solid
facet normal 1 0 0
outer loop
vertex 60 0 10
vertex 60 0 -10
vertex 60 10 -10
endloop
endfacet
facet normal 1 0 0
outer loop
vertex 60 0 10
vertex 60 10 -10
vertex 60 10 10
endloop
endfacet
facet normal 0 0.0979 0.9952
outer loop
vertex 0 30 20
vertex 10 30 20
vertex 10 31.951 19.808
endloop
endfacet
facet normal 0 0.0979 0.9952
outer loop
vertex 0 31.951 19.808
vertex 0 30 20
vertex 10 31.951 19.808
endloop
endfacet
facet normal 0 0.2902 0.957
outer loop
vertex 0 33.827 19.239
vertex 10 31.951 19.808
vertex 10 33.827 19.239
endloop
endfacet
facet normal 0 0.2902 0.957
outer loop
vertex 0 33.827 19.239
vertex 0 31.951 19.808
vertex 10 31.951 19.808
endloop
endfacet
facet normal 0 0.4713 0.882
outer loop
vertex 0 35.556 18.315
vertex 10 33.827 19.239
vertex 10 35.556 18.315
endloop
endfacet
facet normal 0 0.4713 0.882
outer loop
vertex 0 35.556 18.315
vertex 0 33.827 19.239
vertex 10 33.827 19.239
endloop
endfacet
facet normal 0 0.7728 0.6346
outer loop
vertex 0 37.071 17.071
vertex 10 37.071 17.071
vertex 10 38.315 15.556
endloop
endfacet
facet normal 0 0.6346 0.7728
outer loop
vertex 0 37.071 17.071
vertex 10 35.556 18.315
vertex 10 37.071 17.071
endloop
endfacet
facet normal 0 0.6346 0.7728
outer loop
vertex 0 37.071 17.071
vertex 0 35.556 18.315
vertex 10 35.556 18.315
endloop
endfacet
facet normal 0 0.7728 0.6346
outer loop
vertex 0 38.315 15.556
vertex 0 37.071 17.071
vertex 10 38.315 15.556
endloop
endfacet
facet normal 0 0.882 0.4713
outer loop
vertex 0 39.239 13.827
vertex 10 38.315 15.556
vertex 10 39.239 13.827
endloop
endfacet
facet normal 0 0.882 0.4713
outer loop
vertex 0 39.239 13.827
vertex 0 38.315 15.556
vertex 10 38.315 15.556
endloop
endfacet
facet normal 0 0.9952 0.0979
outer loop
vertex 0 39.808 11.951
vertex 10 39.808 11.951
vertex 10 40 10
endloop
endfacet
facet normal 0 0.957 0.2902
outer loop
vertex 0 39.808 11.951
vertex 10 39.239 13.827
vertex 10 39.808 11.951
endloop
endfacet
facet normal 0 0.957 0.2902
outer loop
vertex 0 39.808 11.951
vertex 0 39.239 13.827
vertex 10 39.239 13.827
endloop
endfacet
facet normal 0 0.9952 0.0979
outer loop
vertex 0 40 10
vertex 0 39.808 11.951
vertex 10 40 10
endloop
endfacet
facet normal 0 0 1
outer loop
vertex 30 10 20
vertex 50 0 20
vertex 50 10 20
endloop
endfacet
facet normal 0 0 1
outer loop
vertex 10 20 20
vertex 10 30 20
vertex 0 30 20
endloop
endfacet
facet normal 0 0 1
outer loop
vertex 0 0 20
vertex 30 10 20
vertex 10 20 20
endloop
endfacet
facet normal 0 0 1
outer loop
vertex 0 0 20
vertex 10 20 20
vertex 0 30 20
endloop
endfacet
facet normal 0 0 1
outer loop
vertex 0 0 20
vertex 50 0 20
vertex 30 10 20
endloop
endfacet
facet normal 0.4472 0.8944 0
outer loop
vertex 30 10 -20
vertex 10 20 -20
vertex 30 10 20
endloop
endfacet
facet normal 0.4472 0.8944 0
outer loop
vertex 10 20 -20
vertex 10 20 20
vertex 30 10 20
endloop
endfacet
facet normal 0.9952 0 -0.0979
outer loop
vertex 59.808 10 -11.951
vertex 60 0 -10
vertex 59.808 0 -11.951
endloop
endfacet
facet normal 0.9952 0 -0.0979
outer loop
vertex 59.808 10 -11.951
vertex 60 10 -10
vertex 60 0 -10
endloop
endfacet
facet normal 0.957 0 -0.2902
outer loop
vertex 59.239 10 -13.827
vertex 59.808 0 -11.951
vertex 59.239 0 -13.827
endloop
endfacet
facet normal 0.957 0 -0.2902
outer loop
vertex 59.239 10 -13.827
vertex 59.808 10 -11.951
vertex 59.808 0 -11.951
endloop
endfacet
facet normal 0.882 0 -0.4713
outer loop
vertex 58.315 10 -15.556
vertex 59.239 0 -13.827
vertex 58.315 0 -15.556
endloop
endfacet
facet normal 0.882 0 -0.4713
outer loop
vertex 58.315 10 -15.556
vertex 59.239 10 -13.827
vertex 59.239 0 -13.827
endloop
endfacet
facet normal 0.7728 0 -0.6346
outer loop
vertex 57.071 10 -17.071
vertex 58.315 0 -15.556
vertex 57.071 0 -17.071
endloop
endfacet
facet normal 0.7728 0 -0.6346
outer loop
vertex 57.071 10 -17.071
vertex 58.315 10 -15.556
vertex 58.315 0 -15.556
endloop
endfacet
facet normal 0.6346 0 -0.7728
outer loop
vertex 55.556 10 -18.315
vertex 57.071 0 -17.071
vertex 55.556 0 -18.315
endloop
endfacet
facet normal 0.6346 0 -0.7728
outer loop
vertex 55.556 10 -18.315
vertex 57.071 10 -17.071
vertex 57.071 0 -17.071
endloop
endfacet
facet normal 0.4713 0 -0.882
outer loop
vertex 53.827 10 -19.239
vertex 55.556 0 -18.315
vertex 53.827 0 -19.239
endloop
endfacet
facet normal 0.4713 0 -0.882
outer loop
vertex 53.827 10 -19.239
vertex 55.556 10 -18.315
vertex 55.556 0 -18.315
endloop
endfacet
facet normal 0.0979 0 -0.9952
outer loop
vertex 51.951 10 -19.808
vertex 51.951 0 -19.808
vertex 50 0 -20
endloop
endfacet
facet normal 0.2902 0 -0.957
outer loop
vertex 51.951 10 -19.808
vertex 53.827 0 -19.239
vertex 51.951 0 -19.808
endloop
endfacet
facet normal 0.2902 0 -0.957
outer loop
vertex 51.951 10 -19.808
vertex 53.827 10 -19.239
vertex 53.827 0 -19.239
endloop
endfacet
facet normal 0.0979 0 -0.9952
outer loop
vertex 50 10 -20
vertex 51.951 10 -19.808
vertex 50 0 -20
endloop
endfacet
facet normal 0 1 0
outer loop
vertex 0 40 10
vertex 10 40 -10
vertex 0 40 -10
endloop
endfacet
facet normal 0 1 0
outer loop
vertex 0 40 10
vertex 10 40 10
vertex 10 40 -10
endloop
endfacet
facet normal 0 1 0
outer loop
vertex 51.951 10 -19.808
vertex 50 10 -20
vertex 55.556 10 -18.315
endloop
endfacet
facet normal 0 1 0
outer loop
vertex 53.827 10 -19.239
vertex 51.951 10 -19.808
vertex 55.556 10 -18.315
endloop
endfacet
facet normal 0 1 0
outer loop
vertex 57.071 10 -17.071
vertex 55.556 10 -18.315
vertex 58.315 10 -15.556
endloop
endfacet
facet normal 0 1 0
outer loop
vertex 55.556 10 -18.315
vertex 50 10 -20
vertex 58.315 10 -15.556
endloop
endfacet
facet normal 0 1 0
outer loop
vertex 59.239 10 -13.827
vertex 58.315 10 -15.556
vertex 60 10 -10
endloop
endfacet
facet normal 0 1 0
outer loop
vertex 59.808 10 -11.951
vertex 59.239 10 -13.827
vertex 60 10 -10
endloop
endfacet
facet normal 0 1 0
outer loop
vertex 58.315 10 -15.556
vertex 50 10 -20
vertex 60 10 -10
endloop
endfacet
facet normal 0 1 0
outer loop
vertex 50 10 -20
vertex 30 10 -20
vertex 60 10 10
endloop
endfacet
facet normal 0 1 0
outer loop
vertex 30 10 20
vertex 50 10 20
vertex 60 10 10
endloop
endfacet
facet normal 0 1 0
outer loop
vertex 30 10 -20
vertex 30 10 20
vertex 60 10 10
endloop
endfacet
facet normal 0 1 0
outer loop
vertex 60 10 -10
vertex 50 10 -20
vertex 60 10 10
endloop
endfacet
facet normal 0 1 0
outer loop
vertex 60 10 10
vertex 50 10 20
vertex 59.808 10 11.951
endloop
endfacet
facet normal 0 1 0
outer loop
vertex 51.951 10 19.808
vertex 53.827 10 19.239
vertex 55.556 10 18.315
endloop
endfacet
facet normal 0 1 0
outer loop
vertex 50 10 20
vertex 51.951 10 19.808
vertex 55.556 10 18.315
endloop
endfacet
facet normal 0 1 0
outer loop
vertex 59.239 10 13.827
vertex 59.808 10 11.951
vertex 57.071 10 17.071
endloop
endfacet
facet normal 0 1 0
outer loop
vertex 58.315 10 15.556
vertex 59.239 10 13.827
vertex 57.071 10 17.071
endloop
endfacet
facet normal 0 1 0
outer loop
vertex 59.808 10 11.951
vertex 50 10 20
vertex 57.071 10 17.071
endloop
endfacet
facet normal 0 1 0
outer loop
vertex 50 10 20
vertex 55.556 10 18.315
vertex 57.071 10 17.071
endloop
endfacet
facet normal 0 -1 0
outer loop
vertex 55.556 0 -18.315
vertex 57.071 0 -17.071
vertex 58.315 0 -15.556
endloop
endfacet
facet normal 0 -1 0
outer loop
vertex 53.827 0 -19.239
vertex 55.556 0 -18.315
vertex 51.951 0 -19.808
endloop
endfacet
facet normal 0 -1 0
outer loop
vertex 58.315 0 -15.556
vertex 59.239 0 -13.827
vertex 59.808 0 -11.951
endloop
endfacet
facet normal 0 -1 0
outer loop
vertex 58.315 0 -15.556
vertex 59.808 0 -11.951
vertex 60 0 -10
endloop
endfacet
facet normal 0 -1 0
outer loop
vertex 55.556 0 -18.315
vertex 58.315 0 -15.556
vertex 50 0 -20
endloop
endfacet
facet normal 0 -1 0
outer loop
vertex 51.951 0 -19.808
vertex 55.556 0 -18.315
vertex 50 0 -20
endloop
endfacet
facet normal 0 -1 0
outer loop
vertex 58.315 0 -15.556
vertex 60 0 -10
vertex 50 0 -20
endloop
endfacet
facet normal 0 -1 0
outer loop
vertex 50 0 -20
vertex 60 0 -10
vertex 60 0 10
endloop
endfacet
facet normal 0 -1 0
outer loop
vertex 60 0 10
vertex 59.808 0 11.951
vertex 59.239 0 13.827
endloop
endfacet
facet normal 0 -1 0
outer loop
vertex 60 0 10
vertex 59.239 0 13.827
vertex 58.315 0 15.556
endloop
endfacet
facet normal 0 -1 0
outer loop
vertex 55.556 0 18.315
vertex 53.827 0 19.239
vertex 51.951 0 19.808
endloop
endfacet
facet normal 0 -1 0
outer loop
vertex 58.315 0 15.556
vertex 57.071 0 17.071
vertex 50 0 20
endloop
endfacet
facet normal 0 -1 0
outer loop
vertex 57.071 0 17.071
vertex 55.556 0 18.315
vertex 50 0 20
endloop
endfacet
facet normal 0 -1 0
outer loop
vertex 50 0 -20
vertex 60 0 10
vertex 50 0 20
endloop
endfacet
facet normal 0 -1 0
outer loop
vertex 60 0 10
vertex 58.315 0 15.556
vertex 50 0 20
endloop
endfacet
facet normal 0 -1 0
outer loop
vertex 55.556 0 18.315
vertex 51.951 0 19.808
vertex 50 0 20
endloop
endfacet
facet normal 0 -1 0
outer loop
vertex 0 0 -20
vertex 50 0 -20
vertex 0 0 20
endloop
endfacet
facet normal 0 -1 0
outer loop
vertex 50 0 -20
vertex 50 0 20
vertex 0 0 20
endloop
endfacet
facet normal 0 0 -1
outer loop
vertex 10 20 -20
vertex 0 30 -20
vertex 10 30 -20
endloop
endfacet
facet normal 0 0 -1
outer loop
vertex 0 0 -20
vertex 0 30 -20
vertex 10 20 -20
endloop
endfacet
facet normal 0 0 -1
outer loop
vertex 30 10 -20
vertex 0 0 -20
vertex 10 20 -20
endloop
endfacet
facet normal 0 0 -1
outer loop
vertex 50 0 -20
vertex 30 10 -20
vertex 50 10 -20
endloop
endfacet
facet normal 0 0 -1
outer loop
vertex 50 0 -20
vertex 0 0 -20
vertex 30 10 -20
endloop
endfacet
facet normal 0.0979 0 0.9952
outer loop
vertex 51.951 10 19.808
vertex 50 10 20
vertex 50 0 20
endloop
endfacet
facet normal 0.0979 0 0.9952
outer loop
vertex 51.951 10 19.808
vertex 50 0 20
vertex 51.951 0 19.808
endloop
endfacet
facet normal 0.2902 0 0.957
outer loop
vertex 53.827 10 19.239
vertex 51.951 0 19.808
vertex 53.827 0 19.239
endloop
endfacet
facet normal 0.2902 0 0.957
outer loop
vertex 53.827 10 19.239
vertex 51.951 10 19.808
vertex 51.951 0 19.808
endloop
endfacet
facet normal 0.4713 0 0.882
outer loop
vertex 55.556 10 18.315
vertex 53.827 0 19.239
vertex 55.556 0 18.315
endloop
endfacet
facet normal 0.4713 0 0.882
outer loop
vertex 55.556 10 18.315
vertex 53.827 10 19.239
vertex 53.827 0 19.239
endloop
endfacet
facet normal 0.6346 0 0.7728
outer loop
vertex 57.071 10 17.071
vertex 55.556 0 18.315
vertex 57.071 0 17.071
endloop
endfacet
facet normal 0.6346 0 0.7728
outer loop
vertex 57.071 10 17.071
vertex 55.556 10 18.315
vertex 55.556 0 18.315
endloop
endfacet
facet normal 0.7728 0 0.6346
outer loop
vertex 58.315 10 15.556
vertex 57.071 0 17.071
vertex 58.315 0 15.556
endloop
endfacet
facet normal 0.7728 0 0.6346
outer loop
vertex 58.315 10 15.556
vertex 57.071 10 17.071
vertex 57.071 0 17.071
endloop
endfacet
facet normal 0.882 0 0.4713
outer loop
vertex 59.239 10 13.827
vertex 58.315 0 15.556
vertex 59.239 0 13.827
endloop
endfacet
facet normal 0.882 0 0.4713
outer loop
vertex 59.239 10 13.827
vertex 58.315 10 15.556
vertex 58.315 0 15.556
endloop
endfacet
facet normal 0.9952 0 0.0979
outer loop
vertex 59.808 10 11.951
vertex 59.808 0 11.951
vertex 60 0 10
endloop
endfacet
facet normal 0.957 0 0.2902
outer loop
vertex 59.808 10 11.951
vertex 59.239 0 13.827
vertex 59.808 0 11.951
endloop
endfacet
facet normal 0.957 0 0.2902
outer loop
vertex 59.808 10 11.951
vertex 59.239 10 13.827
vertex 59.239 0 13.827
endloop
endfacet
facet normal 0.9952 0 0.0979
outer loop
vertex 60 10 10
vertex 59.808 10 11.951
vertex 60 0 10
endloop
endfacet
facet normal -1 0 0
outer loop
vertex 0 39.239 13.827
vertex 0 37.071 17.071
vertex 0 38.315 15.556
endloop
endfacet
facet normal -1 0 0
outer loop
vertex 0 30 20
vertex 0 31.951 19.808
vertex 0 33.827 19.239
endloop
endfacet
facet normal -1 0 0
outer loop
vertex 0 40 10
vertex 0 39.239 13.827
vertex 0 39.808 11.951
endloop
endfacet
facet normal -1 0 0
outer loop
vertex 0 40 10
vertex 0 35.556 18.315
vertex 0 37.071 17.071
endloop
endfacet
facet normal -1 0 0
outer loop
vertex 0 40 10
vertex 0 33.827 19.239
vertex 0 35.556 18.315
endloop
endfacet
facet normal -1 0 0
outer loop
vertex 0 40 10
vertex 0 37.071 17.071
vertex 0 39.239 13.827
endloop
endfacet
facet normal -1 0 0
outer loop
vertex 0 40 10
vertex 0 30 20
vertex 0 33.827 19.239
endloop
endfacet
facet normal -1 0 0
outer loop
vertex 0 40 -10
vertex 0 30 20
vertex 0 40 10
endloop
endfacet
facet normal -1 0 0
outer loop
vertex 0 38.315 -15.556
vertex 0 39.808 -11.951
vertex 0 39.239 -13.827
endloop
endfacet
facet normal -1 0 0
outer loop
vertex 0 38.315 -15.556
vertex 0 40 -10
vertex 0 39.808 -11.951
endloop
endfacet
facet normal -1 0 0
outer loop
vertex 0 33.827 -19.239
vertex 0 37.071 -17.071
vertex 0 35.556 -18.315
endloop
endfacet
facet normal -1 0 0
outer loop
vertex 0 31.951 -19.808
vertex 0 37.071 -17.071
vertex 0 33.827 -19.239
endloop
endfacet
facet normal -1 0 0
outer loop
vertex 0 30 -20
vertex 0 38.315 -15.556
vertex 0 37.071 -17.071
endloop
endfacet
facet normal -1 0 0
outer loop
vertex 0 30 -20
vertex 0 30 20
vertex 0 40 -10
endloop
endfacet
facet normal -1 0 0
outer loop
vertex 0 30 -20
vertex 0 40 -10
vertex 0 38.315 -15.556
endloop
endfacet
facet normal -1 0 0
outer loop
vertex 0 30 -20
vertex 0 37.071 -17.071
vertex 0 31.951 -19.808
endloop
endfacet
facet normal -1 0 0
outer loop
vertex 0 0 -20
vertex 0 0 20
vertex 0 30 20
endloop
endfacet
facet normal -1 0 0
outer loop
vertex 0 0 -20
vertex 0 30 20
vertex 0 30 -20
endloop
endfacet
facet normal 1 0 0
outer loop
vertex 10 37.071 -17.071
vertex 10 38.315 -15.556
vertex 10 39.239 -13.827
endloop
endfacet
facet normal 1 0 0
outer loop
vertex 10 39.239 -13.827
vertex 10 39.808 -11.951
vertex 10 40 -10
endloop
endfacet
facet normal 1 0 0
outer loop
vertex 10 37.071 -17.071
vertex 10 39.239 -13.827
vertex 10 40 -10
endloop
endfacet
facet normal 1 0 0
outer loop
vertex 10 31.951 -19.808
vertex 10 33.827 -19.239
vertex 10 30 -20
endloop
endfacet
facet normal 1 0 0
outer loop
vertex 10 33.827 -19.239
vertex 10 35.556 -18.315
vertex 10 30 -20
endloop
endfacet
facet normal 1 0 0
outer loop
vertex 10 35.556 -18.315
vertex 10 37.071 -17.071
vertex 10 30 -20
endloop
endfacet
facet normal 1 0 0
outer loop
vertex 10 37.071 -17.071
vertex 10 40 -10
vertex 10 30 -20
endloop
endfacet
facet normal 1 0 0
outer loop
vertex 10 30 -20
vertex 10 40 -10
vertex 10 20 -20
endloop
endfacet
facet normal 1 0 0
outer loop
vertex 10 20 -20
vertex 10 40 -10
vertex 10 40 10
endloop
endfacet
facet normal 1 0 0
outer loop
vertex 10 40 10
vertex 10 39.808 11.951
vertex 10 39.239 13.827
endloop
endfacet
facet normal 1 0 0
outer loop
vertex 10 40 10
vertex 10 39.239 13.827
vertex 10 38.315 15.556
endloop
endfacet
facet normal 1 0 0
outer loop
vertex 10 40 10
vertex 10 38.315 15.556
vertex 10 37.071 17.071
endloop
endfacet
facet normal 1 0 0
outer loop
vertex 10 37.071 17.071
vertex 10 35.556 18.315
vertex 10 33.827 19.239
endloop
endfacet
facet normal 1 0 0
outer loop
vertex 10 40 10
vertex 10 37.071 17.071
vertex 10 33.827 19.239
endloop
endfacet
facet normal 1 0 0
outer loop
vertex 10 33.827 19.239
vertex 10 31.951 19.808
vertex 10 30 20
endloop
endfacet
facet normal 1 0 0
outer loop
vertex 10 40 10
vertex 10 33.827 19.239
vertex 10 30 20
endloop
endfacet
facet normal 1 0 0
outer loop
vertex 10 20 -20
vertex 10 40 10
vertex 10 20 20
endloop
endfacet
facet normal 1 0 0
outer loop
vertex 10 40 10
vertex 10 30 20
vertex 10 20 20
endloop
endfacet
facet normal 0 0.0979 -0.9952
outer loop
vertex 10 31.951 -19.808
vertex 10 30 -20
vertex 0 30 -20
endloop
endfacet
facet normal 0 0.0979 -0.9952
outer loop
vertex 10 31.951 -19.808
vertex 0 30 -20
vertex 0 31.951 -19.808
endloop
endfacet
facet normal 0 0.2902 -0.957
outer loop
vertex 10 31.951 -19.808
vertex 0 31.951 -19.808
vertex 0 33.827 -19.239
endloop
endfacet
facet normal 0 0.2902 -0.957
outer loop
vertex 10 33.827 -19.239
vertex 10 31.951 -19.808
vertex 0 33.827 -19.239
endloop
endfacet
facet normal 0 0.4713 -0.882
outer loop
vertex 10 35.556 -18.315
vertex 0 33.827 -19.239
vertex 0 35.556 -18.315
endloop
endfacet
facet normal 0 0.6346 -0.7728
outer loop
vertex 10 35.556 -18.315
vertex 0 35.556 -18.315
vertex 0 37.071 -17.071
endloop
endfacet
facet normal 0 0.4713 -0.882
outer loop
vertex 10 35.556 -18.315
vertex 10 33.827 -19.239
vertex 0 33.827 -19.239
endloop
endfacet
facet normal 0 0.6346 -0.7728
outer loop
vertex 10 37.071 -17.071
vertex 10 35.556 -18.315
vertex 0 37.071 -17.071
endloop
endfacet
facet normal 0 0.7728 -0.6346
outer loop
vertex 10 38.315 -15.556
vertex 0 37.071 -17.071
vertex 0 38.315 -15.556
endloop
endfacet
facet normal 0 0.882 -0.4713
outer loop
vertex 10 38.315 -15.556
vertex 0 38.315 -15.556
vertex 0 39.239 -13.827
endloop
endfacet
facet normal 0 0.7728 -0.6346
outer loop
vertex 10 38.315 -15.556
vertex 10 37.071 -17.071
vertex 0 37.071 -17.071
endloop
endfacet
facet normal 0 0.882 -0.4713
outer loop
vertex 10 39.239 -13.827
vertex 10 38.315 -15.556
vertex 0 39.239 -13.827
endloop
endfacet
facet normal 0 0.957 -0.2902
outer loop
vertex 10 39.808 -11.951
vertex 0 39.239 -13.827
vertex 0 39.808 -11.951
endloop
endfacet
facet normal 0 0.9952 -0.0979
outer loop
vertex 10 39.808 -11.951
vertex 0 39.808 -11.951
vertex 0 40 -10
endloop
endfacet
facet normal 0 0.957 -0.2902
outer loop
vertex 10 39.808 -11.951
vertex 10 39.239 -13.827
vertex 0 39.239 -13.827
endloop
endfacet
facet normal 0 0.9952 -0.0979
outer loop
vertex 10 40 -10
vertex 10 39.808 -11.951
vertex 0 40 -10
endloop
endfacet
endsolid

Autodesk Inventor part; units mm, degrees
ref_plane "YZ Plane" through (0, 0, 0) normal (1, 0, 0) x (0, 1, 0)
ref_plane "XZ Plane" through (0, 0, 0) normal (0, 1, 0) x (-1, 0, 0)
ref_plane "XY Plane" through (0, 0, 0) normal (0, 0, 1) x (1, 0, 0)
sketch "草圖1" plane through (0, 0, 0) normal (0, 1, 0) x (-1, 0, 0)
  line L0 (0, -20) -> (-60, -20)
  line L1 (-60, -20) -> (-60, 20)
  line L2 (-60, 20) -> (0, 20)
  line L3 (0, 20) -> (0, -20)
  point P0 (0, 0)
  point P1 (0, 0)
  dimension "d0" = 40
  dimension "d1" = 60
extrude "擠出1" add sketch "草圖1" along normal blind 40
sketch "草圖2" plane through (0, 0, 20) normal (0, 0, 1) x (1, 0, 0)
  line L0 (0, 0) -> (0, 40) projected
  line L1 (0, 40) -> (60, 40) projected
  line L2 (60, 40) -> (60, 0) projected
  line L3 (60, 0) -> (0, 0) projected
  line L4 (10, 40) -> (10, 20)
  line L5 (10, 20) -> (30, 10)
  line L6 (30, 10) -> (60, 10)
  line L7 (60, 0) -> (60, 40) projected
  dimension "d4" = 10
  dimension "d5" = 10
  dimension "d6" = 20
  dimension "d7" = 30
extrude "擠出2" cut sketch "草圖2" against normal through all contours L1 L2 L6 L5 L4
fillet "圓角1" radius 10 4 edges at (5, 40, 20) (5, 40, -20) (60, 5, 20) (60, 5, -20)
properties part number "33" material "鋼、碳鋼"
